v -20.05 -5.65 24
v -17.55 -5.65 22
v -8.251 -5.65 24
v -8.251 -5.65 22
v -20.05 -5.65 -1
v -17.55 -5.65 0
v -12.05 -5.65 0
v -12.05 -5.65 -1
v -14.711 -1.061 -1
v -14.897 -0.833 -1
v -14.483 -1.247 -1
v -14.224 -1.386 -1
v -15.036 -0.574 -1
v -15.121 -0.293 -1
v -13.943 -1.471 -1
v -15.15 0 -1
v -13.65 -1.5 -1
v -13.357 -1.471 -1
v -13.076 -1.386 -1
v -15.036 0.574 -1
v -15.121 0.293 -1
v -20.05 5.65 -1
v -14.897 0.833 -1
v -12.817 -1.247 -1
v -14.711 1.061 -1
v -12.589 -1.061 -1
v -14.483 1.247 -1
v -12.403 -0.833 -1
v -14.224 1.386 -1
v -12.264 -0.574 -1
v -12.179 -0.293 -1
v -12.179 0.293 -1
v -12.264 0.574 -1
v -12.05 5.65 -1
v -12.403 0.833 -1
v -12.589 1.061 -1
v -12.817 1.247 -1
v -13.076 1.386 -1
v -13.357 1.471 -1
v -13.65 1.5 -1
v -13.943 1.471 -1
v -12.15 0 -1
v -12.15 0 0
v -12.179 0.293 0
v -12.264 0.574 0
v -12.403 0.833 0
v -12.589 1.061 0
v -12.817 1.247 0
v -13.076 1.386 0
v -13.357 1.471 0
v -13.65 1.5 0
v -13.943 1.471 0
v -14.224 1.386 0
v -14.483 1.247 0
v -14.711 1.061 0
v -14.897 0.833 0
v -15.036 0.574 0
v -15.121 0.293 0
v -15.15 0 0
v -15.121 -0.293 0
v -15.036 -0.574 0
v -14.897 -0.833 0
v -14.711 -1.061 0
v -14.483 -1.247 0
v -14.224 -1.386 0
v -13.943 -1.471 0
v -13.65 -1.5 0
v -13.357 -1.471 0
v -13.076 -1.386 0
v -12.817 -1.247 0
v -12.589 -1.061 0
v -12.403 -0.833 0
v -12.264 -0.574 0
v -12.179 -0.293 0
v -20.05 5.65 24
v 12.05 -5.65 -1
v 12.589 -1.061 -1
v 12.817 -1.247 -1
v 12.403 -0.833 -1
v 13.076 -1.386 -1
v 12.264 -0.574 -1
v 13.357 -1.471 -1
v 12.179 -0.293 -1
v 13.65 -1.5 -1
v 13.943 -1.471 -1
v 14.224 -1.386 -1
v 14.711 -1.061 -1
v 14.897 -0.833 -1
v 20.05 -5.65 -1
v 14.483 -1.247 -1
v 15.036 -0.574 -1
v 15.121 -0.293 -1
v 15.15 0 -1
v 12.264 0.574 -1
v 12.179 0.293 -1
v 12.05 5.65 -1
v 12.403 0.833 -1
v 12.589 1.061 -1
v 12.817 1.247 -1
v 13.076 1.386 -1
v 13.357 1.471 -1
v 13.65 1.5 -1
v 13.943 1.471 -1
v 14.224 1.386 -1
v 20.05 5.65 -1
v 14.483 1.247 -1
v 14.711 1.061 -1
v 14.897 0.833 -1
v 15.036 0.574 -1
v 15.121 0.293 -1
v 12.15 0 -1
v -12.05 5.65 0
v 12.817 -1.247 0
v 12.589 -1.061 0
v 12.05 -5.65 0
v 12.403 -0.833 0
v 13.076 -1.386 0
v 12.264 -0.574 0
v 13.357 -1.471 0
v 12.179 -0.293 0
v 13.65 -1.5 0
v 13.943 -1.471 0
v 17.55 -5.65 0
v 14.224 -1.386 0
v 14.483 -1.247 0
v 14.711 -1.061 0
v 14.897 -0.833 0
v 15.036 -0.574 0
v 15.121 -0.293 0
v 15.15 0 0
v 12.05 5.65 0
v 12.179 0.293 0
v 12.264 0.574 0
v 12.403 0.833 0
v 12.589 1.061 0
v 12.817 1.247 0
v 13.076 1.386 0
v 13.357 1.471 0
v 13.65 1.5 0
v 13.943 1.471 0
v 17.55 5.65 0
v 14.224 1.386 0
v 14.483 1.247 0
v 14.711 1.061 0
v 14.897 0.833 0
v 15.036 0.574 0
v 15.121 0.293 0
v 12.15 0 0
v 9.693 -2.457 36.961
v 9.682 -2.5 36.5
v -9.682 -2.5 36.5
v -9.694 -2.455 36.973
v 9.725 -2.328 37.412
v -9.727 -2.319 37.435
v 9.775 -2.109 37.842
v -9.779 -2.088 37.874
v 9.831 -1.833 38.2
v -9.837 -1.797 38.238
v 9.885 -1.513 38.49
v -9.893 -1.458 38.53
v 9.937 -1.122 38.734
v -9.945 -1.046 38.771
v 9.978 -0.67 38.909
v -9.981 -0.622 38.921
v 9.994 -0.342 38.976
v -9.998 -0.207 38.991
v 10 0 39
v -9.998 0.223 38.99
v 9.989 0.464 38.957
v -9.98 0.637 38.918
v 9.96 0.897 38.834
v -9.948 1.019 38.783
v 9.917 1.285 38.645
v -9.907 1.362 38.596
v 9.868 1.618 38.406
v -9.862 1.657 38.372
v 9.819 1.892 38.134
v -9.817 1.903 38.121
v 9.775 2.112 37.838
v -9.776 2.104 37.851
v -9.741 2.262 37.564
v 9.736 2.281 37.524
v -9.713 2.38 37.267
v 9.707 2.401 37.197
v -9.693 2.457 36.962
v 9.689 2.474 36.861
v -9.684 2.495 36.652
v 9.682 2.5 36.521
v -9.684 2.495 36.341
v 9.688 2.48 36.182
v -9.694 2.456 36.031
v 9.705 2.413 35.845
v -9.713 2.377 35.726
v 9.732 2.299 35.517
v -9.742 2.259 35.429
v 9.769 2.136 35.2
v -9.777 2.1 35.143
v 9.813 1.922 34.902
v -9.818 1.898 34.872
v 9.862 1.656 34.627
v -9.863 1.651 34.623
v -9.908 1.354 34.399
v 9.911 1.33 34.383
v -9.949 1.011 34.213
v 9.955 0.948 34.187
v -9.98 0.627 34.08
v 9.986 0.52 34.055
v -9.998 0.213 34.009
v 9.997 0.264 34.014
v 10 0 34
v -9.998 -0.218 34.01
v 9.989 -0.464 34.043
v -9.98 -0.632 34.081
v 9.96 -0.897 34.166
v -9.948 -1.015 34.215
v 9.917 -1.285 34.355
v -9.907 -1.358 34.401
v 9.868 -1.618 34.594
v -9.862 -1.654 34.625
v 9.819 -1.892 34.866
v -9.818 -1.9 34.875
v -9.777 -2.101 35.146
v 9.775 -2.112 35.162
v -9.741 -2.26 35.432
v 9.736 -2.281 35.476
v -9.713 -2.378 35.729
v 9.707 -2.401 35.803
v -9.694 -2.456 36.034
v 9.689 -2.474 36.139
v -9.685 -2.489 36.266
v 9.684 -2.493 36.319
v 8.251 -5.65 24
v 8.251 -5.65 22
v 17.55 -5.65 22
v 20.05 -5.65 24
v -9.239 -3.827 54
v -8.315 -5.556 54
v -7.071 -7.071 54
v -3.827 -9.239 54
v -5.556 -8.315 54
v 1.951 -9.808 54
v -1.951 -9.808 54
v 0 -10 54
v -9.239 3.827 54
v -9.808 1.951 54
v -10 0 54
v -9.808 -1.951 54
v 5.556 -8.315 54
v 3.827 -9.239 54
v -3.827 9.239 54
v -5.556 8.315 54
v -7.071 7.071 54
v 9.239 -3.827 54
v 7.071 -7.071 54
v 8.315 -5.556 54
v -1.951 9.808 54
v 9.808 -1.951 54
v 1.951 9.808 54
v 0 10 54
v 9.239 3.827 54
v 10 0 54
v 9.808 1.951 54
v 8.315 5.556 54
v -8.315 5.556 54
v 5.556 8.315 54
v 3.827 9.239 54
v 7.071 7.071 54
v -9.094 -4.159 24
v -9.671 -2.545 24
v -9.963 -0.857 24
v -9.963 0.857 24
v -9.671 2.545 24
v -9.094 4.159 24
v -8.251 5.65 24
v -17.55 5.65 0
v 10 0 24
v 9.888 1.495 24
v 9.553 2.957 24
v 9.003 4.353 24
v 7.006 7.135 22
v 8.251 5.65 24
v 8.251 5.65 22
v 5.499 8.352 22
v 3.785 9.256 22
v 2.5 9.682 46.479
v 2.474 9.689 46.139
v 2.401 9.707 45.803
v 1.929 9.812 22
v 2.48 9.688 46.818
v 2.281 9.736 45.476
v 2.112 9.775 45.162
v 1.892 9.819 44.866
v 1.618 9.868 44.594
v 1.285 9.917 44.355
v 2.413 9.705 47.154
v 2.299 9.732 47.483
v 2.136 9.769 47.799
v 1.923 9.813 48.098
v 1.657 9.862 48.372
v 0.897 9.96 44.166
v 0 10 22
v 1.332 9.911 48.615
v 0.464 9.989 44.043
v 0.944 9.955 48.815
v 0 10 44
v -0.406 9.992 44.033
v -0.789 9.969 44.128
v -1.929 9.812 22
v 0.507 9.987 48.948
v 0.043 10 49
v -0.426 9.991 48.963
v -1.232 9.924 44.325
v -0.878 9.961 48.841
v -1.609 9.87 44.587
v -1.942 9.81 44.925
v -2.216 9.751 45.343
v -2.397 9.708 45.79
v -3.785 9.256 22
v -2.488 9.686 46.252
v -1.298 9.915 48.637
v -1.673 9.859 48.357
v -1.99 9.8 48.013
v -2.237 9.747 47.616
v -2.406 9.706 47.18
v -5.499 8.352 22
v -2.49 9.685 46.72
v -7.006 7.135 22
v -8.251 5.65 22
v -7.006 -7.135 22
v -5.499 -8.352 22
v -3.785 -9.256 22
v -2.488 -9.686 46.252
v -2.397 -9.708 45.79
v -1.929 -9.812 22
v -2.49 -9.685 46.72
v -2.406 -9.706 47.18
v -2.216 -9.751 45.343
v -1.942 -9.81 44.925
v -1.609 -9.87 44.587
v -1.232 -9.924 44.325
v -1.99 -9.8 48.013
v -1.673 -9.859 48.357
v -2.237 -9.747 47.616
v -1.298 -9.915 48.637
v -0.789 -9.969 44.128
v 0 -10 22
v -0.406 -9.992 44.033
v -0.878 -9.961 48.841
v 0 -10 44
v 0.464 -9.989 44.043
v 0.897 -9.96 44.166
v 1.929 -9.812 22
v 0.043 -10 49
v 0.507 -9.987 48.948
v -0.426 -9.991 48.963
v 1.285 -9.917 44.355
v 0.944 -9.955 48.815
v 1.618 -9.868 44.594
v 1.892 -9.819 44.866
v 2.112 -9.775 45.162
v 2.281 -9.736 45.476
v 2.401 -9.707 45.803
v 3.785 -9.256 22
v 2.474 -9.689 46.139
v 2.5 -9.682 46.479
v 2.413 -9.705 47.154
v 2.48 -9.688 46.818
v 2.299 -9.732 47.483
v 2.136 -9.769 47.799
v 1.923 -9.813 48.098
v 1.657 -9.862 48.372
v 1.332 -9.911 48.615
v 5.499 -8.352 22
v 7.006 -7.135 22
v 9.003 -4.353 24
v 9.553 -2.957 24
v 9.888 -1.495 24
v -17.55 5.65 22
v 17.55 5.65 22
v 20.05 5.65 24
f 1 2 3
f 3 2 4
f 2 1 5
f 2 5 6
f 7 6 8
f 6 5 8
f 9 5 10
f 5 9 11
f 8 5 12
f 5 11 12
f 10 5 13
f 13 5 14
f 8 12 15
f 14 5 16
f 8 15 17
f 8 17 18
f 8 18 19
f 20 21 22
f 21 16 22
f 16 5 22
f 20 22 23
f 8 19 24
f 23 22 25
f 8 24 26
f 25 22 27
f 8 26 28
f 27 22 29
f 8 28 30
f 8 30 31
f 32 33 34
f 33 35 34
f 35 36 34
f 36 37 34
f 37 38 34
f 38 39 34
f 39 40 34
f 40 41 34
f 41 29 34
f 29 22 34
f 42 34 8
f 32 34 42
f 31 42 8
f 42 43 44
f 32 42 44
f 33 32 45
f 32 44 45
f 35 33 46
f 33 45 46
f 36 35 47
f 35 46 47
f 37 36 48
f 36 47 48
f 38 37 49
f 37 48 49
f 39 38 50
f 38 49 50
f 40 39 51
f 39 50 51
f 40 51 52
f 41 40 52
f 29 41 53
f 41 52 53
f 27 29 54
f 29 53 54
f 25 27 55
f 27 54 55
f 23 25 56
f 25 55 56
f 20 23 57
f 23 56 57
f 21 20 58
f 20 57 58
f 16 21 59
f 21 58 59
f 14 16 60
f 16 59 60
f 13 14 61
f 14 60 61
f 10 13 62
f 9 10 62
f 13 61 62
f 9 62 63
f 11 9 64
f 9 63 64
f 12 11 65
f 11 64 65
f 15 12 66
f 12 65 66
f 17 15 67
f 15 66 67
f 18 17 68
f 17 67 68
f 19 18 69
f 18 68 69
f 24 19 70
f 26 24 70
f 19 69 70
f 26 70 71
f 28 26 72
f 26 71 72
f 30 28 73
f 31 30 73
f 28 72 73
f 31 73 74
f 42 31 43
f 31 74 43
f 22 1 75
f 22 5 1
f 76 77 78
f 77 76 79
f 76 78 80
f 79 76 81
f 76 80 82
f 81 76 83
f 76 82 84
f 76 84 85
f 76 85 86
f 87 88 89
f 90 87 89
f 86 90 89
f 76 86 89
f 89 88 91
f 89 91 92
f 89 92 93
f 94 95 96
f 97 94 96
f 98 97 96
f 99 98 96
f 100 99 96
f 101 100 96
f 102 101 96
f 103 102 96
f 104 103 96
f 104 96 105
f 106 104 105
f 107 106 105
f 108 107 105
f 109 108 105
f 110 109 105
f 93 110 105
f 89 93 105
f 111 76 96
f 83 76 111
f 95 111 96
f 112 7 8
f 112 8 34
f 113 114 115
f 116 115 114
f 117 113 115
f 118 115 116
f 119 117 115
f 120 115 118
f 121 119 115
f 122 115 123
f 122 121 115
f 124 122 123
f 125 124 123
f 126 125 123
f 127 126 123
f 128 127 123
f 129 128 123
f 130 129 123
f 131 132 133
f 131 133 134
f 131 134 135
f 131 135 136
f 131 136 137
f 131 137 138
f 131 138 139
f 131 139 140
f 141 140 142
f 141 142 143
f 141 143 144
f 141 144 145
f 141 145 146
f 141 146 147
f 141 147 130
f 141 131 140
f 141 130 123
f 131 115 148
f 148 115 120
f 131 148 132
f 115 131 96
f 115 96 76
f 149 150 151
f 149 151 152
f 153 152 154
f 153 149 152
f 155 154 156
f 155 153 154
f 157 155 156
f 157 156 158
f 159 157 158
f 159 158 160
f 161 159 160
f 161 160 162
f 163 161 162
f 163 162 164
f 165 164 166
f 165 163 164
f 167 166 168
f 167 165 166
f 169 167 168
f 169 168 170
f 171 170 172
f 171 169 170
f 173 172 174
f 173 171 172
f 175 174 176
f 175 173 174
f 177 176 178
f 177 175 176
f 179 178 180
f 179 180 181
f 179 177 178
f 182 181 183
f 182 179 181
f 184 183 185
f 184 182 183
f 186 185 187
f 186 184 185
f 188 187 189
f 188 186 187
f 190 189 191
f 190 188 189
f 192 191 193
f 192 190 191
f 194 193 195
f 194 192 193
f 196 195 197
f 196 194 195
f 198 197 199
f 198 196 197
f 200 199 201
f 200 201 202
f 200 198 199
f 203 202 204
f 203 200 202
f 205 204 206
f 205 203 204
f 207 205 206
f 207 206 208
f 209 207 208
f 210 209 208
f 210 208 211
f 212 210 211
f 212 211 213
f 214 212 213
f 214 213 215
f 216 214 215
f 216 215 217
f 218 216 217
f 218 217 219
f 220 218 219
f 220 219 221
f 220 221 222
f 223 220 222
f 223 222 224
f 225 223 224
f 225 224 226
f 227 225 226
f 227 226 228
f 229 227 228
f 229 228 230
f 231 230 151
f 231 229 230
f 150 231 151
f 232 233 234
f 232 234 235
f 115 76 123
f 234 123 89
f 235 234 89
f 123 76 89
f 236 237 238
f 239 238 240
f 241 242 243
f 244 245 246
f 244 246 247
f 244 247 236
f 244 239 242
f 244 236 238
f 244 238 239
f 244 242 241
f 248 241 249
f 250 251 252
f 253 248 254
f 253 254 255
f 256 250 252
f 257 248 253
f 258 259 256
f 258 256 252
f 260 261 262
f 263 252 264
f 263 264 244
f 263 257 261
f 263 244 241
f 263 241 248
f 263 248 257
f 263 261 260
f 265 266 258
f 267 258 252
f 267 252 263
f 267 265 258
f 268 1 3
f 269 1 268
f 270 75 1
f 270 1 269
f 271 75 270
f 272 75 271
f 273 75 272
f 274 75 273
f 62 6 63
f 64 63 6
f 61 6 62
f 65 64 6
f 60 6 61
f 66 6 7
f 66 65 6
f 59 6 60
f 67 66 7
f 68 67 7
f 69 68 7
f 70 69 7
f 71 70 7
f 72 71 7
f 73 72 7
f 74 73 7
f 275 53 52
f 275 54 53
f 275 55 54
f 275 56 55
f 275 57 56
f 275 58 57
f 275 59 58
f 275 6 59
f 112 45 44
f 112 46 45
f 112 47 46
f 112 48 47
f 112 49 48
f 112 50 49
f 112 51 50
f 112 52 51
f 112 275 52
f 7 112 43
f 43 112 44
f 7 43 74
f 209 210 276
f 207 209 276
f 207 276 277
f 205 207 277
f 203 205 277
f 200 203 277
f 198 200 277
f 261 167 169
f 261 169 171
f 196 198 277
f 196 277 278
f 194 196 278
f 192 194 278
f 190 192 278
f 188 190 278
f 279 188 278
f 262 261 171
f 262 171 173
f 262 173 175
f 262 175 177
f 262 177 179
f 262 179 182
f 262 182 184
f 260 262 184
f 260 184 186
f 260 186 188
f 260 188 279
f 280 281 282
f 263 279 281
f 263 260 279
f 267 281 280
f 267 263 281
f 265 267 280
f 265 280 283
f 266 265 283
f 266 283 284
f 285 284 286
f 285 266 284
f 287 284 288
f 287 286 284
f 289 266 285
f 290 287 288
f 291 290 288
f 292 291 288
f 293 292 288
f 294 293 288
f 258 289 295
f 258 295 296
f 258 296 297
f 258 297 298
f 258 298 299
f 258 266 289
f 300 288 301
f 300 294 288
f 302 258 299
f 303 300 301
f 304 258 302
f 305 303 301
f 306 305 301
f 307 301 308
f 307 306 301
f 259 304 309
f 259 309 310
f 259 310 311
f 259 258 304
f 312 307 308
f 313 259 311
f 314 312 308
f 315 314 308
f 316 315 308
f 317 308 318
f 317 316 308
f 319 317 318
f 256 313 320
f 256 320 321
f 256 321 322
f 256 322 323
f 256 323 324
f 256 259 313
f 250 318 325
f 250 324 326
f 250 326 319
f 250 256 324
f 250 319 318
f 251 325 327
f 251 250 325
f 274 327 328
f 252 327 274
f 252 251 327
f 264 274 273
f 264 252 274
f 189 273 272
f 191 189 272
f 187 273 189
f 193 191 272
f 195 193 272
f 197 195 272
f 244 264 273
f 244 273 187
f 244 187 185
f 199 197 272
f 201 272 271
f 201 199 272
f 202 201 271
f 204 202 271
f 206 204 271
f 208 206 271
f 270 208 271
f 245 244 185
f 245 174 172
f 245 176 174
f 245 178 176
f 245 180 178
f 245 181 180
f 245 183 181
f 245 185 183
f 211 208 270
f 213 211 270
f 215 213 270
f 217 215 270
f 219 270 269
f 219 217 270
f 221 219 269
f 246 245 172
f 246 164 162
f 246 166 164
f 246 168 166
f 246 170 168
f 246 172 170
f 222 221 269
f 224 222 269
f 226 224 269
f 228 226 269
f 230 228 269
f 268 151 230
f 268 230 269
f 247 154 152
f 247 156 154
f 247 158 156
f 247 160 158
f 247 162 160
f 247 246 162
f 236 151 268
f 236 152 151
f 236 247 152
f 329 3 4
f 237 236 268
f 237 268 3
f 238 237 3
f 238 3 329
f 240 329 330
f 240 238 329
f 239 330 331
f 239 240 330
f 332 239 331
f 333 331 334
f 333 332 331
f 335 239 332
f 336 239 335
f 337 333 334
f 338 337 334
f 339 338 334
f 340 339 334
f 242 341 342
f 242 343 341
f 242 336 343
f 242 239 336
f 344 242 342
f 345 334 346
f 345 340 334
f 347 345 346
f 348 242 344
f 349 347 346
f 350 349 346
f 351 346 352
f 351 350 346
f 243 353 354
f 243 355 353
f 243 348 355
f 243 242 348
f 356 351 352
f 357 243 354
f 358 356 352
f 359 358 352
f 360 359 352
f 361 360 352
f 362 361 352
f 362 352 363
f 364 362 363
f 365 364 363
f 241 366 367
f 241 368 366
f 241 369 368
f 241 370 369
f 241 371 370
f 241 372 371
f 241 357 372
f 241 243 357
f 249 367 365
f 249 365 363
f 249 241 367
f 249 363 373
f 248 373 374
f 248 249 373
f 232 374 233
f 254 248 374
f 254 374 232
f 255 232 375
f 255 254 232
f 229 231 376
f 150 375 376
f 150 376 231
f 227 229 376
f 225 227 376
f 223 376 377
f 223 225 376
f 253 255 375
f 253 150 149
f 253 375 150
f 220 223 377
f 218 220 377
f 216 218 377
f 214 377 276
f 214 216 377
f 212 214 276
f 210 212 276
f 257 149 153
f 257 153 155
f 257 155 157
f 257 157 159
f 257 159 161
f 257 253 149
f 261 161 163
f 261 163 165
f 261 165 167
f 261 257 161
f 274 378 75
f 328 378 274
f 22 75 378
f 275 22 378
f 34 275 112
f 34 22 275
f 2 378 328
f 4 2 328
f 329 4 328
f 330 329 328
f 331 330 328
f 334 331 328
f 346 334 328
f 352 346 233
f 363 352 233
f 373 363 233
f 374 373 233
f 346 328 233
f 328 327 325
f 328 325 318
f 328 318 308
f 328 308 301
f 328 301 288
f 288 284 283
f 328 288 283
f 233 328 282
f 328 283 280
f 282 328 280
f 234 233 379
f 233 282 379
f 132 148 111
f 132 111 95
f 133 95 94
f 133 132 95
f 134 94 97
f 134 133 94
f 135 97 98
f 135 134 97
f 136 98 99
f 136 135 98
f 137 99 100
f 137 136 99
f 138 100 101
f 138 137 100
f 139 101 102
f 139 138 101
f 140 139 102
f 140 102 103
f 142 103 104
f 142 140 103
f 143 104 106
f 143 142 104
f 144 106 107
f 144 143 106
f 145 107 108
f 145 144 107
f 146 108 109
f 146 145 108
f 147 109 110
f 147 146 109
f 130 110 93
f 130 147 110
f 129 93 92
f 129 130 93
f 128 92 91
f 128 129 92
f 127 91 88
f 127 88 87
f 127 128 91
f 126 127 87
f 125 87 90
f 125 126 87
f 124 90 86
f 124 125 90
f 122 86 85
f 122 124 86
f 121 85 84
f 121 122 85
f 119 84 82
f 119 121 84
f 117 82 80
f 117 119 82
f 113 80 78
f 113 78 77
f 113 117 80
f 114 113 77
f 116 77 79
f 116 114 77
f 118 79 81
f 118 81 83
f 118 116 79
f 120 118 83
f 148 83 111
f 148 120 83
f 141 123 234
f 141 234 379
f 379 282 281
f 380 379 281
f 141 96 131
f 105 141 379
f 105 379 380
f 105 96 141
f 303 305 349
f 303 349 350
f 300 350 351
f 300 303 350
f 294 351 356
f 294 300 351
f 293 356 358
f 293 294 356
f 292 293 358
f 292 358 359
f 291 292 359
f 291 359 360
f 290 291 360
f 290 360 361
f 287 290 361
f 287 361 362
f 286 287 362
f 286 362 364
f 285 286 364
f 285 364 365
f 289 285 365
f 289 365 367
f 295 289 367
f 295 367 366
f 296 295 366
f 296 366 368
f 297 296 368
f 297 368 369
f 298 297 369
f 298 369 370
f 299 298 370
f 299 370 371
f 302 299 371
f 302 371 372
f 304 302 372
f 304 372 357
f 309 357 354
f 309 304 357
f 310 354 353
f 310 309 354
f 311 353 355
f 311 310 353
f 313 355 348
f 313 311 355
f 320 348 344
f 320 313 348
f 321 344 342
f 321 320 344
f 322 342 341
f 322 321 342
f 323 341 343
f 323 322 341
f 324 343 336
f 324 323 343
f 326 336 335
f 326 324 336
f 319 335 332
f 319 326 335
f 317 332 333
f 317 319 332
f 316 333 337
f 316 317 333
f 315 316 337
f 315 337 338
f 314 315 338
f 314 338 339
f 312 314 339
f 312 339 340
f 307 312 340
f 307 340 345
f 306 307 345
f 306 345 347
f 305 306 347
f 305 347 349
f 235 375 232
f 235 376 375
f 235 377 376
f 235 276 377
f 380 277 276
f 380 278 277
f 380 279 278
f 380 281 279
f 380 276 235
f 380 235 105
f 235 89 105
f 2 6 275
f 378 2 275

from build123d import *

# Parameters (mm, degrees)
SKETCH_1_R               = 1.5
SKETCH_1_W               = 4
SKETCH_1_H               = 11.3
EXTRUDE_1_DEPTH          = 1
SKETCH_2_W               = 2.5
SKETCH_2_H               = 11.3
EXTRUDE_2_DEPTH          = 22
SKETCH_3_W               = 40.1
SKETCH_3_H               = 11.3
EXTRUDE_3_DEPTH          = 2
SKETCH_4_R               = 10
EXTRUDE_4_DEPTH          = 2
EXTRUDE_START            = 30
SKETCH_6_R               = 10
EXTRUDE_5_DEPTH          = 30
CUT_EXTRUDE_2_DEPTH      = 60.690242084
CUT_EXTRUDE_2_DEPTH_BACK = 60.690242084
SKETCH_8_R               = 2.5
CUT_EXTRUDE_3_DEPTH      = 69.000073623
CUT_EXTRUDE_3_DEPTH_BACK = 69.000073623
SKETCH_9_R               = 2.5


with BuildPart() as part:
    # 草图1 → 凸台-拉伸1 (new body)
    # profile 1 of 4: a face of its own
    with BuildSketch(Plane.XY):
        Polygon((-12.05, -5.65), (-12.05, 0), (-12.05, 5.65), (-16.05, 5.65), (-16.05, -5.65), align=None)
        with Locations((-13.65, 0)):
            Circle(SKETCH_1_R, mode=Mode.SUBTRACT)
    # profile 2 of 4: a face of its own
    with BuildSketch(Plane.XY):
        Polygon((12.05, 5.65), (12.05, 0), (12.05, -5.65), (16.05, -5.65), (16.05, 5.65), align=None)
        with BuildLine():
            ThreePointArc((15.15, 0), (13.65, -1.5), (12.15, 0))
            ThreePointArc((12.15, 0), (13.65, 1.5), (15.15, 0))
        make_face(mode=Mode.SUBTRACT)
    # profile 3 of 4: a face of its own
    with BuildSketch(Plane.XY):
        with Locations((-18.05, 0)):
            Rectangle(SKETCH_1_W, SKETCH_1_H)
    # profile 4 of 4: a face of its own
    with BuildSketch(Plane.XY):
        with Locations((18.05, 0)):
            Rectangle(SKETCH_1_W, SKETCH_1_H)
    extrude(amount=-EXTRUDE_1_DEPTH)

    # 草图2 → 凸台-拉伸2 (add)
    with BuildSketch(Plane.XY):
        with Locations((-18.8, 0)):
            Rectangle(SKETCH_2_W, SKETCH_2_H)
        with Locations((18.8, 0)):
            Rectangle(SKETCH_2_W, SKETCH_2_H)
    extrude(amount=EXTRUDE_2_DEPTH)

    # 草图3 → 凸台-拉伸3 (add)
    with BuildSketch(Plane.XY.offset(22)):
        Rectangle(SKETCH_3_W, SKETCH_3_H)
    extrude(amount=EXTRUDE_3_DEPTH)

    # 草图4 → 凸台-拉伸4 (add)
    with BuildSketch(Plane.XY.offset(24)):
        Circle(SKETCH_4_R)
    extrude(amount=-EXTRUDE_4_DEPTH)

    # 草图6 → 凸台-拉伸5 (add)
    with BuildSketch(Plane.XY.offset(24).offset(EXTRUDE_START)):
        Circle(SKETCH_6_R)
    extrude(amount=-EXTRUDE_5_DEPTH)

    # 草图8 → 切除-拉伸2 (cut, two sides: drawn at the far end of the back side and taken through both)
    with BuildSketch(Plane.XZ.offset(5.65).offset(-CUT_EXTRUDE_2_DEPTH_BACK)):
        with Locations(Location((0, 46.5, 0), (0, 0, 270))):
            Circle(SKETCH_8_R)
    extrude(amount=CUT_EXTRUDE_2_DEPTH + CUT_EXTRUDE_2_DEPTH_BACK, mode=Mode.SUBTRACT)

    # 草图9 → 切除-拉伸3 (cut, two sides: drawn at the far end of the back side and taken through both)
    with BuildSketch(Plane.ZY.offset(20.05).offset(-CUT_EXTRUDE_3_DEPTH_BACK)):
        with Locations(Location((36.5, 0, 0), (0, 0, 270))):
            Circle(SKETCH_9_R)
    extrude(amount=CUT_EXTRUDE_3_DEPTH + CUT_EXTRUDE_3_DEPTH_BACK, mode=Mode.SUBTRACT)


solid = part.part
